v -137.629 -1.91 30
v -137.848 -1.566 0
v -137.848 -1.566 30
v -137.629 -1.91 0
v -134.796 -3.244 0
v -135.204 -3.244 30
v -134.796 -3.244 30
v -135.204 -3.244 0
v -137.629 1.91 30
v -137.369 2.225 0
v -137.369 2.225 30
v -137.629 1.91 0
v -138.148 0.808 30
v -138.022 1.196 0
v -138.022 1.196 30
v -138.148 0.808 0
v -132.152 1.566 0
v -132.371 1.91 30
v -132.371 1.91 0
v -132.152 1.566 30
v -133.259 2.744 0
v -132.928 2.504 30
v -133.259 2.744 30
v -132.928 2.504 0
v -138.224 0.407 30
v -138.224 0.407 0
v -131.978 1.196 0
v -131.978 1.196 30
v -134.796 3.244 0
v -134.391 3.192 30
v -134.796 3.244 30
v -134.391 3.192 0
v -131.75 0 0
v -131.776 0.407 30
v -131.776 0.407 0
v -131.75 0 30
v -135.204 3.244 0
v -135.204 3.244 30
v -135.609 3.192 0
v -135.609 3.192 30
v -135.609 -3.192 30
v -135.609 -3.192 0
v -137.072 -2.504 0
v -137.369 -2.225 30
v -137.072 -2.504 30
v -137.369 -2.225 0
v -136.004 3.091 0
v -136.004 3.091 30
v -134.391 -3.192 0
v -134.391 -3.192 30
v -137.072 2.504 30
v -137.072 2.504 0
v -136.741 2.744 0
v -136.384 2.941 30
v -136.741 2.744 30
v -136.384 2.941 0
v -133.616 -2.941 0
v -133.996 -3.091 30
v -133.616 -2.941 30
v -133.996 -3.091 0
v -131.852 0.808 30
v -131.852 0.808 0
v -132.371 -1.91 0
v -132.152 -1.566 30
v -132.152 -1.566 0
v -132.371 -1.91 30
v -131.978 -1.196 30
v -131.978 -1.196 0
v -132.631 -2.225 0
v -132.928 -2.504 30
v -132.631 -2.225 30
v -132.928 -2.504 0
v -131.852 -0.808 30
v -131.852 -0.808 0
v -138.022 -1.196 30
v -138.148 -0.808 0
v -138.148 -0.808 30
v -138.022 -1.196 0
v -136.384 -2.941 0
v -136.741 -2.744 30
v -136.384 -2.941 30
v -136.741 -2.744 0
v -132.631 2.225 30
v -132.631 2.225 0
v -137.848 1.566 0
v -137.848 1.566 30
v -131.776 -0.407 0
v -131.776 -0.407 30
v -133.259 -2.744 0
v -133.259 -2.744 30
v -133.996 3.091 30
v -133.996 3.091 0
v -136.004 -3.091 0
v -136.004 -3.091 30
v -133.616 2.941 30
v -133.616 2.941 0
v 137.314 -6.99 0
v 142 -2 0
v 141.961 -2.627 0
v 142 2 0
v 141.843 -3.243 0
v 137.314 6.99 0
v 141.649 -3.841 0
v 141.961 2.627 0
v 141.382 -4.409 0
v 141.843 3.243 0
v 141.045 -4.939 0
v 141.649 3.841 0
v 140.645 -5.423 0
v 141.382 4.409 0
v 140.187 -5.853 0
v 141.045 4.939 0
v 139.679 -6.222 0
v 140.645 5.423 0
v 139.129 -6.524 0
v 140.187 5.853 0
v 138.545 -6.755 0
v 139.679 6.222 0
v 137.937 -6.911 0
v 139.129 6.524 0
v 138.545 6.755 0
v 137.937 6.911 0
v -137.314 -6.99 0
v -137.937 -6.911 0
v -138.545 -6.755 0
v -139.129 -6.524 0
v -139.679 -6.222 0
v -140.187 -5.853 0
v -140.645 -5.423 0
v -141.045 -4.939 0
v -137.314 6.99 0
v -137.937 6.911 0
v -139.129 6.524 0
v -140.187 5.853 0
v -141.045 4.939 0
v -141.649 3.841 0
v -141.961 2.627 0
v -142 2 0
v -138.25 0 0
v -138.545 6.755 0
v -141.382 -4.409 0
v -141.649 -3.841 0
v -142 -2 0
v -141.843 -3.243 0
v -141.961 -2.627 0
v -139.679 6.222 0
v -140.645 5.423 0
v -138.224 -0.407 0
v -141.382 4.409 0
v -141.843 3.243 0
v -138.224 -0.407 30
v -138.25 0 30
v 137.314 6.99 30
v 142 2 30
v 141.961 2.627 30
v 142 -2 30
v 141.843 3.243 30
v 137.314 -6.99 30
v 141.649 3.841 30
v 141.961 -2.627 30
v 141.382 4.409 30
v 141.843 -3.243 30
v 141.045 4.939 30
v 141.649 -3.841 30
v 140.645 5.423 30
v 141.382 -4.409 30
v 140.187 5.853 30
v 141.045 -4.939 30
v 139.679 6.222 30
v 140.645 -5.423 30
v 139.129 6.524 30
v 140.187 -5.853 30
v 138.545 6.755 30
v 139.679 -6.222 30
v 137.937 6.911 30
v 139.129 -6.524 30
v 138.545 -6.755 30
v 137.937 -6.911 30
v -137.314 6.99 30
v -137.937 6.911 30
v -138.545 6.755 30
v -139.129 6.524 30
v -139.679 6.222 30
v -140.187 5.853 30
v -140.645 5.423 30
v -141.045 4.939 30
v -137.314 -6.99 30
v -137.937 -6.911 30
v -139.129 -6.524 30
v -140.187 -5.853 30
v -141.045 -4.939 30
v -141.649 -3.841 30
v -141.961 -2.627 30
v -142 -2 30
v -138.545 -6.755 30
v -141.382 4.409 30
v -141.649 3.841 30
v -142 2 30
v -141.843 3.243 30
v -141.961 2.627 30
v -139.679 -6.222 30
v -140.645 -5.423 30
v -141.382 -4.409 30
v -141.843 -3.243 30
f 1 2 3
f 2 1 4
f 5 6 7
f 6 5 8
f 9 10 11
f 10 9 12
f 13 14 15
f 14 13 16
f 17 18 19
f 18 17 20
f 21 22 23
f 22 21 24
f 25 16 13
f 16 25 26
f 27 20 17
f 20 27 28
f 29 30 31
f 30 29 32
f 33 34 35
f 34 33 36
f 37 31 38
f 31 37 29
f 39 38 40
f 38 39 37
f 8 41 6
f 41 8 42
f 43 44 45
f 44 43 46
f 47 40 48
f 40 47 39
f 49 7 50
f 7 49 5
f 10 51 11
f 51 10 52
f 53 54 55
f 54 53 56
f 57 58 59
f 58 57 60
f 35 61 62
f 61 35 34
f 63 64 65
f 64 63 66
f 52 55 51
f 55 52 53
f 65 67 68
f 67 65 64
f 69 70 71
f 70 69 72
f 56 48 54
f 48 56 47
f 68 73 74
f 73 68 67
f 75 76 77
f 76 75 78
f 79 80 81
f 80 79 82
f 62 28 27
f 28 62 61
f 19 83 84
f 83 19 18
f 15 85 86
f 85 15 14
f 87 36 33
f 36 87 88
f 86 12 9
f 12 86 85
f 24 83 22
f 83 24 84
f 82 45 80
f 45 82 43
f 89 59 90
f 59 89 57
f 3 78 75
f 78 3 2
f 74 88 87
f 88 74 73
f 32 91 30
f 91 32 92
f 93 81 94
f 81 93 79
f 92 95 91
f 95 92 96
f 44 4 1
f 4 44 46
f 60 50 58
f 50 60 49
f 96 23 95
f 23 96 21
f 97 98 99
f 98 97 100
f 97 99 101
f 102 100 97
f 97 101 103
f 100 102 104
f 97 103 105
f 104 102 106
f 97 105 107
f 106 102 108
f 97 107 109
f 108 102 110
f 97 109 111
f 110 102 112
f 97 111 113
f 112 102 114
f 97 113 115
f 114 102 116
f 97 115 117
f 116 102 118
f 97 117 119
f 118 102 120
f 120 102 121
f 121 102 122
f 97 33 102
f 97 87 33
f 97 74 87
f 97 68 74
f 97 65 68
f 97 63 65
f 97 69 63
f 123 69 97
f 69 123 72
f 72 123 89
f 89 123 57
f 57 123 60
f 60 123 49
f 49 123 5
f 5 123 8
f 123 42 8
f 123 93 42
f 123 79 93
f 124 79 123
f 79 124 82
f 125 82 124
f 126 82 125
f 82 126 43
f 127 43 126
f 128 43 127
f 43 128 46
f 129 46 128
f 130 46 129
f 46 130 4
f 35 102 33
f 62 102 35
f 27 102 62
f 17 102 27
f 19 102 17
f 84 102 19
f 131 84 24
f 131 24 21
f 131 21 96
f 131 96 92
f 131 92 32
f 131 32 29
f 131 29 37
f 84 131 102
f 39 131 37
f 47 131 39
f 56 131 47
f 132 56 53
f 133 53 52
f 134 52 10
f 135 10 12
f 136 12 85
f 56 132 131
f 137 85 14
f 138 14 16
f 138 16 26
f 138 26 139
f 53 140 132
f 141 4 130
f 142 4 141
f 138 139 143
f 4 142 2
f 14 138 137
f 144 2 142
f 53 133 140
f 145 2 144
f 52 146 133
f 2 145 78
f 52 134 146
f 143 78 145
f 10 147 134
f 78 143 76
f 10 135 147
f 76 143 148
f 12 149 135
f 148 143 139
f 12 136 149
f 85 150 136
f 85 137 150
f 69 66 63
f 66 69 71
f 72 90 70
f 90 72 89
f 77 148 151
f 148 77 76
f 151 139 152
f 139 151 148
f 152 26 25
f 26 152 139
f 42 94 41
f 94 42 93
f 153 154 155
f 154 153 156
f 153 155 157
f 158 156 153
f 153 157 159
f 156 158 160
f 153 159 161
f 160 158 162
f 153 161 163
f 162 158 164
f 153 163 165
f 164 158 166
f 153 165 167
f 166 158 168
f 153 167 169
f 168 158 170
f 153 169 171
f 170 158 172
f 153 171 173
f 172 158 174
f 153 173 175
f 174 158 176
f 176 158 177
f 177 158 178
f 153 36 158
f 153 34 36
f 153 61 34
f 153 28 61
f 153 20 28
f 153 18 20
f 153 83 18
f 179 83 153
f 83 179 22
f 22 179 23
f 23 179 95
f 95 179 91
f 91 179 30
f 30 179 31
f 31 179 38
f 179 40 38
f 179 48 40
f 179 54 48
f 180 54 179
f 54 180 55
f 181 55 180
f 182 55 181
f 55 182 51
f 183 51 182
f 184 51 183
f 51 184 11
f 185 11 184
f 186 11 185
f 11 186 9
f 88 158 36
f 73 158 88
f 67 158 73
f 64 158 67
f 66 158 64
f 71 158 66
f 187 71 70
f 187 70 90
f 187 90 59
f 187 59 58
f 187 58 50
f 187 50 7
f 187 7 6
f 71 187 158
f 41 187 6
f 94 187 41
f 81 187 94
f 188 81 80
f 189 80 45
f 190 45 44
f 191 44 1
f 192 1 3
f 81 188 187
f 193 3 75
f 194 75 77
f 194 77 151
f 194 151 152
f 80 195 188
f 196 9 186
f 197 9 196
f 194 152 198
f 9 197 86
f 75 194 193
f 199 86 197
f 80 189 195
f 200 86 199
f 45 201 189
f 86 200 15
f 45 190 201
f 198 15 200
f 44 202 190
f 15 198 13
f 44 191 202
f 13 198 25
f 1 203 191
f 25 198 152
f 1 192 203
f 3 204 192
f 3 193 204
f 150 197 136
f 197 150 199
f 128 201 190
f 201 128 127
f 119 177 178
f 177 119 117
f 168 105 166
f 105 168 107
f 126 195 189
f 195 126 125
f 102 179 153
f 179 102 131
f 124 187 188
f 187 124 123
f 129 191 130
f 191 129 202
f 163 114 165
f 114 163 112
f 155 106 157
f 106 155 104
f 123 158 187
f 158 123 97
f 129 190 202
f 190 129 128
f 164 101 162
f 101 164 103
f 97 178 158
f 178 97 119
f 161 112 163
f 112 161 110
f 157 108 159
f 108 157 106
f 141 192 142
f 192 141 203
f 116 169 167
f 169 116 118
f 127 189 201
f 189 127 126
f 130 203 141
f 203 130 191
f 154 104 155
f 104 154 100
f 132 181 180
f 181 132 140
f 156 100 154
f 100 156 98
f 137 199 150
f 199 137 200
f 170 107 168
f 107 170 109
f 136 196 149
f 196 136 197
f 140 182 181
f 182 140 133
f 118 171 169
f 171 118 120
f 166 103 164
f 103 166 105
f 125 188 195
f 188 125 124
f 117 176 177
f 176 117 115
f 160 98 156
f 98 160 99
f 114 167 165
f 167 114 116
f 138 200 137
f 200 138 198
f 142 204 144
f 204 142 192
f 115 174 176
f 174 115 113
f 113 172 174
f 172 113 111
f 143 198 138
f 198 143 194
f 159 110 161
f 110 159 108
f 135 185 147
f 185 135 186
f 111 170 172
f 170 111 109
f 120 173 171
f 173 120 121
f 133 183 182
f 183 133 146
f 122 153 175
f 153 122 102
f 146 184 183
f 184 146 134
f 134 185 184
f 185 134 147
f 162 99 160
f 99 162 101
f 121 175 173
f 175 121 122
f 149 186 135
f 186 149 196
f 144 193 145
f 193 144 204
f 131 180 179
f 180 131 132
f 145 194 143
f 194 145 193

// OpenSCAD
$fn = 50;


difference() {
	union() {
		hull() {
			translate(v = [-137.0000000000, 2.0000000000, 0]) {
				cylinder(h = 30, r = 5);
			}
			translate(v = [137.0000000000, 2.0000000000, 0]) {
				cylinder(h = 30, r = 5);
			}
			translate(v = [-137.0000000000, -2.0000000000, 0]) {
				cylinder(h = 30, r = 5);
			}
			translate(v = [137.0000000000, -2.0000000000, 0]) {
				cylinder(h = 30, r = 5);
			}
		}
	}
	union() {
		translate(v = [-135.0000000000, 0.0000000000, 0]) {
			cylinder(h = 30, r = 3.2500000000);
		}
		translate(v = [-135.0000000000, 0.0000000000, 0]) {
			cylinder(h = 30, r = 1.8000000000);
		}
		translate(v = [-135.0000000000, 0.0000000000, 0]) {
			cylinder(h = 30, r = 1.8000000000);
		}
		translate(v = [-135.0000000000, 0.0000000000, 0]) {
			cylinder(h = 30, r = 1.8000000000);
		}
	}
}
